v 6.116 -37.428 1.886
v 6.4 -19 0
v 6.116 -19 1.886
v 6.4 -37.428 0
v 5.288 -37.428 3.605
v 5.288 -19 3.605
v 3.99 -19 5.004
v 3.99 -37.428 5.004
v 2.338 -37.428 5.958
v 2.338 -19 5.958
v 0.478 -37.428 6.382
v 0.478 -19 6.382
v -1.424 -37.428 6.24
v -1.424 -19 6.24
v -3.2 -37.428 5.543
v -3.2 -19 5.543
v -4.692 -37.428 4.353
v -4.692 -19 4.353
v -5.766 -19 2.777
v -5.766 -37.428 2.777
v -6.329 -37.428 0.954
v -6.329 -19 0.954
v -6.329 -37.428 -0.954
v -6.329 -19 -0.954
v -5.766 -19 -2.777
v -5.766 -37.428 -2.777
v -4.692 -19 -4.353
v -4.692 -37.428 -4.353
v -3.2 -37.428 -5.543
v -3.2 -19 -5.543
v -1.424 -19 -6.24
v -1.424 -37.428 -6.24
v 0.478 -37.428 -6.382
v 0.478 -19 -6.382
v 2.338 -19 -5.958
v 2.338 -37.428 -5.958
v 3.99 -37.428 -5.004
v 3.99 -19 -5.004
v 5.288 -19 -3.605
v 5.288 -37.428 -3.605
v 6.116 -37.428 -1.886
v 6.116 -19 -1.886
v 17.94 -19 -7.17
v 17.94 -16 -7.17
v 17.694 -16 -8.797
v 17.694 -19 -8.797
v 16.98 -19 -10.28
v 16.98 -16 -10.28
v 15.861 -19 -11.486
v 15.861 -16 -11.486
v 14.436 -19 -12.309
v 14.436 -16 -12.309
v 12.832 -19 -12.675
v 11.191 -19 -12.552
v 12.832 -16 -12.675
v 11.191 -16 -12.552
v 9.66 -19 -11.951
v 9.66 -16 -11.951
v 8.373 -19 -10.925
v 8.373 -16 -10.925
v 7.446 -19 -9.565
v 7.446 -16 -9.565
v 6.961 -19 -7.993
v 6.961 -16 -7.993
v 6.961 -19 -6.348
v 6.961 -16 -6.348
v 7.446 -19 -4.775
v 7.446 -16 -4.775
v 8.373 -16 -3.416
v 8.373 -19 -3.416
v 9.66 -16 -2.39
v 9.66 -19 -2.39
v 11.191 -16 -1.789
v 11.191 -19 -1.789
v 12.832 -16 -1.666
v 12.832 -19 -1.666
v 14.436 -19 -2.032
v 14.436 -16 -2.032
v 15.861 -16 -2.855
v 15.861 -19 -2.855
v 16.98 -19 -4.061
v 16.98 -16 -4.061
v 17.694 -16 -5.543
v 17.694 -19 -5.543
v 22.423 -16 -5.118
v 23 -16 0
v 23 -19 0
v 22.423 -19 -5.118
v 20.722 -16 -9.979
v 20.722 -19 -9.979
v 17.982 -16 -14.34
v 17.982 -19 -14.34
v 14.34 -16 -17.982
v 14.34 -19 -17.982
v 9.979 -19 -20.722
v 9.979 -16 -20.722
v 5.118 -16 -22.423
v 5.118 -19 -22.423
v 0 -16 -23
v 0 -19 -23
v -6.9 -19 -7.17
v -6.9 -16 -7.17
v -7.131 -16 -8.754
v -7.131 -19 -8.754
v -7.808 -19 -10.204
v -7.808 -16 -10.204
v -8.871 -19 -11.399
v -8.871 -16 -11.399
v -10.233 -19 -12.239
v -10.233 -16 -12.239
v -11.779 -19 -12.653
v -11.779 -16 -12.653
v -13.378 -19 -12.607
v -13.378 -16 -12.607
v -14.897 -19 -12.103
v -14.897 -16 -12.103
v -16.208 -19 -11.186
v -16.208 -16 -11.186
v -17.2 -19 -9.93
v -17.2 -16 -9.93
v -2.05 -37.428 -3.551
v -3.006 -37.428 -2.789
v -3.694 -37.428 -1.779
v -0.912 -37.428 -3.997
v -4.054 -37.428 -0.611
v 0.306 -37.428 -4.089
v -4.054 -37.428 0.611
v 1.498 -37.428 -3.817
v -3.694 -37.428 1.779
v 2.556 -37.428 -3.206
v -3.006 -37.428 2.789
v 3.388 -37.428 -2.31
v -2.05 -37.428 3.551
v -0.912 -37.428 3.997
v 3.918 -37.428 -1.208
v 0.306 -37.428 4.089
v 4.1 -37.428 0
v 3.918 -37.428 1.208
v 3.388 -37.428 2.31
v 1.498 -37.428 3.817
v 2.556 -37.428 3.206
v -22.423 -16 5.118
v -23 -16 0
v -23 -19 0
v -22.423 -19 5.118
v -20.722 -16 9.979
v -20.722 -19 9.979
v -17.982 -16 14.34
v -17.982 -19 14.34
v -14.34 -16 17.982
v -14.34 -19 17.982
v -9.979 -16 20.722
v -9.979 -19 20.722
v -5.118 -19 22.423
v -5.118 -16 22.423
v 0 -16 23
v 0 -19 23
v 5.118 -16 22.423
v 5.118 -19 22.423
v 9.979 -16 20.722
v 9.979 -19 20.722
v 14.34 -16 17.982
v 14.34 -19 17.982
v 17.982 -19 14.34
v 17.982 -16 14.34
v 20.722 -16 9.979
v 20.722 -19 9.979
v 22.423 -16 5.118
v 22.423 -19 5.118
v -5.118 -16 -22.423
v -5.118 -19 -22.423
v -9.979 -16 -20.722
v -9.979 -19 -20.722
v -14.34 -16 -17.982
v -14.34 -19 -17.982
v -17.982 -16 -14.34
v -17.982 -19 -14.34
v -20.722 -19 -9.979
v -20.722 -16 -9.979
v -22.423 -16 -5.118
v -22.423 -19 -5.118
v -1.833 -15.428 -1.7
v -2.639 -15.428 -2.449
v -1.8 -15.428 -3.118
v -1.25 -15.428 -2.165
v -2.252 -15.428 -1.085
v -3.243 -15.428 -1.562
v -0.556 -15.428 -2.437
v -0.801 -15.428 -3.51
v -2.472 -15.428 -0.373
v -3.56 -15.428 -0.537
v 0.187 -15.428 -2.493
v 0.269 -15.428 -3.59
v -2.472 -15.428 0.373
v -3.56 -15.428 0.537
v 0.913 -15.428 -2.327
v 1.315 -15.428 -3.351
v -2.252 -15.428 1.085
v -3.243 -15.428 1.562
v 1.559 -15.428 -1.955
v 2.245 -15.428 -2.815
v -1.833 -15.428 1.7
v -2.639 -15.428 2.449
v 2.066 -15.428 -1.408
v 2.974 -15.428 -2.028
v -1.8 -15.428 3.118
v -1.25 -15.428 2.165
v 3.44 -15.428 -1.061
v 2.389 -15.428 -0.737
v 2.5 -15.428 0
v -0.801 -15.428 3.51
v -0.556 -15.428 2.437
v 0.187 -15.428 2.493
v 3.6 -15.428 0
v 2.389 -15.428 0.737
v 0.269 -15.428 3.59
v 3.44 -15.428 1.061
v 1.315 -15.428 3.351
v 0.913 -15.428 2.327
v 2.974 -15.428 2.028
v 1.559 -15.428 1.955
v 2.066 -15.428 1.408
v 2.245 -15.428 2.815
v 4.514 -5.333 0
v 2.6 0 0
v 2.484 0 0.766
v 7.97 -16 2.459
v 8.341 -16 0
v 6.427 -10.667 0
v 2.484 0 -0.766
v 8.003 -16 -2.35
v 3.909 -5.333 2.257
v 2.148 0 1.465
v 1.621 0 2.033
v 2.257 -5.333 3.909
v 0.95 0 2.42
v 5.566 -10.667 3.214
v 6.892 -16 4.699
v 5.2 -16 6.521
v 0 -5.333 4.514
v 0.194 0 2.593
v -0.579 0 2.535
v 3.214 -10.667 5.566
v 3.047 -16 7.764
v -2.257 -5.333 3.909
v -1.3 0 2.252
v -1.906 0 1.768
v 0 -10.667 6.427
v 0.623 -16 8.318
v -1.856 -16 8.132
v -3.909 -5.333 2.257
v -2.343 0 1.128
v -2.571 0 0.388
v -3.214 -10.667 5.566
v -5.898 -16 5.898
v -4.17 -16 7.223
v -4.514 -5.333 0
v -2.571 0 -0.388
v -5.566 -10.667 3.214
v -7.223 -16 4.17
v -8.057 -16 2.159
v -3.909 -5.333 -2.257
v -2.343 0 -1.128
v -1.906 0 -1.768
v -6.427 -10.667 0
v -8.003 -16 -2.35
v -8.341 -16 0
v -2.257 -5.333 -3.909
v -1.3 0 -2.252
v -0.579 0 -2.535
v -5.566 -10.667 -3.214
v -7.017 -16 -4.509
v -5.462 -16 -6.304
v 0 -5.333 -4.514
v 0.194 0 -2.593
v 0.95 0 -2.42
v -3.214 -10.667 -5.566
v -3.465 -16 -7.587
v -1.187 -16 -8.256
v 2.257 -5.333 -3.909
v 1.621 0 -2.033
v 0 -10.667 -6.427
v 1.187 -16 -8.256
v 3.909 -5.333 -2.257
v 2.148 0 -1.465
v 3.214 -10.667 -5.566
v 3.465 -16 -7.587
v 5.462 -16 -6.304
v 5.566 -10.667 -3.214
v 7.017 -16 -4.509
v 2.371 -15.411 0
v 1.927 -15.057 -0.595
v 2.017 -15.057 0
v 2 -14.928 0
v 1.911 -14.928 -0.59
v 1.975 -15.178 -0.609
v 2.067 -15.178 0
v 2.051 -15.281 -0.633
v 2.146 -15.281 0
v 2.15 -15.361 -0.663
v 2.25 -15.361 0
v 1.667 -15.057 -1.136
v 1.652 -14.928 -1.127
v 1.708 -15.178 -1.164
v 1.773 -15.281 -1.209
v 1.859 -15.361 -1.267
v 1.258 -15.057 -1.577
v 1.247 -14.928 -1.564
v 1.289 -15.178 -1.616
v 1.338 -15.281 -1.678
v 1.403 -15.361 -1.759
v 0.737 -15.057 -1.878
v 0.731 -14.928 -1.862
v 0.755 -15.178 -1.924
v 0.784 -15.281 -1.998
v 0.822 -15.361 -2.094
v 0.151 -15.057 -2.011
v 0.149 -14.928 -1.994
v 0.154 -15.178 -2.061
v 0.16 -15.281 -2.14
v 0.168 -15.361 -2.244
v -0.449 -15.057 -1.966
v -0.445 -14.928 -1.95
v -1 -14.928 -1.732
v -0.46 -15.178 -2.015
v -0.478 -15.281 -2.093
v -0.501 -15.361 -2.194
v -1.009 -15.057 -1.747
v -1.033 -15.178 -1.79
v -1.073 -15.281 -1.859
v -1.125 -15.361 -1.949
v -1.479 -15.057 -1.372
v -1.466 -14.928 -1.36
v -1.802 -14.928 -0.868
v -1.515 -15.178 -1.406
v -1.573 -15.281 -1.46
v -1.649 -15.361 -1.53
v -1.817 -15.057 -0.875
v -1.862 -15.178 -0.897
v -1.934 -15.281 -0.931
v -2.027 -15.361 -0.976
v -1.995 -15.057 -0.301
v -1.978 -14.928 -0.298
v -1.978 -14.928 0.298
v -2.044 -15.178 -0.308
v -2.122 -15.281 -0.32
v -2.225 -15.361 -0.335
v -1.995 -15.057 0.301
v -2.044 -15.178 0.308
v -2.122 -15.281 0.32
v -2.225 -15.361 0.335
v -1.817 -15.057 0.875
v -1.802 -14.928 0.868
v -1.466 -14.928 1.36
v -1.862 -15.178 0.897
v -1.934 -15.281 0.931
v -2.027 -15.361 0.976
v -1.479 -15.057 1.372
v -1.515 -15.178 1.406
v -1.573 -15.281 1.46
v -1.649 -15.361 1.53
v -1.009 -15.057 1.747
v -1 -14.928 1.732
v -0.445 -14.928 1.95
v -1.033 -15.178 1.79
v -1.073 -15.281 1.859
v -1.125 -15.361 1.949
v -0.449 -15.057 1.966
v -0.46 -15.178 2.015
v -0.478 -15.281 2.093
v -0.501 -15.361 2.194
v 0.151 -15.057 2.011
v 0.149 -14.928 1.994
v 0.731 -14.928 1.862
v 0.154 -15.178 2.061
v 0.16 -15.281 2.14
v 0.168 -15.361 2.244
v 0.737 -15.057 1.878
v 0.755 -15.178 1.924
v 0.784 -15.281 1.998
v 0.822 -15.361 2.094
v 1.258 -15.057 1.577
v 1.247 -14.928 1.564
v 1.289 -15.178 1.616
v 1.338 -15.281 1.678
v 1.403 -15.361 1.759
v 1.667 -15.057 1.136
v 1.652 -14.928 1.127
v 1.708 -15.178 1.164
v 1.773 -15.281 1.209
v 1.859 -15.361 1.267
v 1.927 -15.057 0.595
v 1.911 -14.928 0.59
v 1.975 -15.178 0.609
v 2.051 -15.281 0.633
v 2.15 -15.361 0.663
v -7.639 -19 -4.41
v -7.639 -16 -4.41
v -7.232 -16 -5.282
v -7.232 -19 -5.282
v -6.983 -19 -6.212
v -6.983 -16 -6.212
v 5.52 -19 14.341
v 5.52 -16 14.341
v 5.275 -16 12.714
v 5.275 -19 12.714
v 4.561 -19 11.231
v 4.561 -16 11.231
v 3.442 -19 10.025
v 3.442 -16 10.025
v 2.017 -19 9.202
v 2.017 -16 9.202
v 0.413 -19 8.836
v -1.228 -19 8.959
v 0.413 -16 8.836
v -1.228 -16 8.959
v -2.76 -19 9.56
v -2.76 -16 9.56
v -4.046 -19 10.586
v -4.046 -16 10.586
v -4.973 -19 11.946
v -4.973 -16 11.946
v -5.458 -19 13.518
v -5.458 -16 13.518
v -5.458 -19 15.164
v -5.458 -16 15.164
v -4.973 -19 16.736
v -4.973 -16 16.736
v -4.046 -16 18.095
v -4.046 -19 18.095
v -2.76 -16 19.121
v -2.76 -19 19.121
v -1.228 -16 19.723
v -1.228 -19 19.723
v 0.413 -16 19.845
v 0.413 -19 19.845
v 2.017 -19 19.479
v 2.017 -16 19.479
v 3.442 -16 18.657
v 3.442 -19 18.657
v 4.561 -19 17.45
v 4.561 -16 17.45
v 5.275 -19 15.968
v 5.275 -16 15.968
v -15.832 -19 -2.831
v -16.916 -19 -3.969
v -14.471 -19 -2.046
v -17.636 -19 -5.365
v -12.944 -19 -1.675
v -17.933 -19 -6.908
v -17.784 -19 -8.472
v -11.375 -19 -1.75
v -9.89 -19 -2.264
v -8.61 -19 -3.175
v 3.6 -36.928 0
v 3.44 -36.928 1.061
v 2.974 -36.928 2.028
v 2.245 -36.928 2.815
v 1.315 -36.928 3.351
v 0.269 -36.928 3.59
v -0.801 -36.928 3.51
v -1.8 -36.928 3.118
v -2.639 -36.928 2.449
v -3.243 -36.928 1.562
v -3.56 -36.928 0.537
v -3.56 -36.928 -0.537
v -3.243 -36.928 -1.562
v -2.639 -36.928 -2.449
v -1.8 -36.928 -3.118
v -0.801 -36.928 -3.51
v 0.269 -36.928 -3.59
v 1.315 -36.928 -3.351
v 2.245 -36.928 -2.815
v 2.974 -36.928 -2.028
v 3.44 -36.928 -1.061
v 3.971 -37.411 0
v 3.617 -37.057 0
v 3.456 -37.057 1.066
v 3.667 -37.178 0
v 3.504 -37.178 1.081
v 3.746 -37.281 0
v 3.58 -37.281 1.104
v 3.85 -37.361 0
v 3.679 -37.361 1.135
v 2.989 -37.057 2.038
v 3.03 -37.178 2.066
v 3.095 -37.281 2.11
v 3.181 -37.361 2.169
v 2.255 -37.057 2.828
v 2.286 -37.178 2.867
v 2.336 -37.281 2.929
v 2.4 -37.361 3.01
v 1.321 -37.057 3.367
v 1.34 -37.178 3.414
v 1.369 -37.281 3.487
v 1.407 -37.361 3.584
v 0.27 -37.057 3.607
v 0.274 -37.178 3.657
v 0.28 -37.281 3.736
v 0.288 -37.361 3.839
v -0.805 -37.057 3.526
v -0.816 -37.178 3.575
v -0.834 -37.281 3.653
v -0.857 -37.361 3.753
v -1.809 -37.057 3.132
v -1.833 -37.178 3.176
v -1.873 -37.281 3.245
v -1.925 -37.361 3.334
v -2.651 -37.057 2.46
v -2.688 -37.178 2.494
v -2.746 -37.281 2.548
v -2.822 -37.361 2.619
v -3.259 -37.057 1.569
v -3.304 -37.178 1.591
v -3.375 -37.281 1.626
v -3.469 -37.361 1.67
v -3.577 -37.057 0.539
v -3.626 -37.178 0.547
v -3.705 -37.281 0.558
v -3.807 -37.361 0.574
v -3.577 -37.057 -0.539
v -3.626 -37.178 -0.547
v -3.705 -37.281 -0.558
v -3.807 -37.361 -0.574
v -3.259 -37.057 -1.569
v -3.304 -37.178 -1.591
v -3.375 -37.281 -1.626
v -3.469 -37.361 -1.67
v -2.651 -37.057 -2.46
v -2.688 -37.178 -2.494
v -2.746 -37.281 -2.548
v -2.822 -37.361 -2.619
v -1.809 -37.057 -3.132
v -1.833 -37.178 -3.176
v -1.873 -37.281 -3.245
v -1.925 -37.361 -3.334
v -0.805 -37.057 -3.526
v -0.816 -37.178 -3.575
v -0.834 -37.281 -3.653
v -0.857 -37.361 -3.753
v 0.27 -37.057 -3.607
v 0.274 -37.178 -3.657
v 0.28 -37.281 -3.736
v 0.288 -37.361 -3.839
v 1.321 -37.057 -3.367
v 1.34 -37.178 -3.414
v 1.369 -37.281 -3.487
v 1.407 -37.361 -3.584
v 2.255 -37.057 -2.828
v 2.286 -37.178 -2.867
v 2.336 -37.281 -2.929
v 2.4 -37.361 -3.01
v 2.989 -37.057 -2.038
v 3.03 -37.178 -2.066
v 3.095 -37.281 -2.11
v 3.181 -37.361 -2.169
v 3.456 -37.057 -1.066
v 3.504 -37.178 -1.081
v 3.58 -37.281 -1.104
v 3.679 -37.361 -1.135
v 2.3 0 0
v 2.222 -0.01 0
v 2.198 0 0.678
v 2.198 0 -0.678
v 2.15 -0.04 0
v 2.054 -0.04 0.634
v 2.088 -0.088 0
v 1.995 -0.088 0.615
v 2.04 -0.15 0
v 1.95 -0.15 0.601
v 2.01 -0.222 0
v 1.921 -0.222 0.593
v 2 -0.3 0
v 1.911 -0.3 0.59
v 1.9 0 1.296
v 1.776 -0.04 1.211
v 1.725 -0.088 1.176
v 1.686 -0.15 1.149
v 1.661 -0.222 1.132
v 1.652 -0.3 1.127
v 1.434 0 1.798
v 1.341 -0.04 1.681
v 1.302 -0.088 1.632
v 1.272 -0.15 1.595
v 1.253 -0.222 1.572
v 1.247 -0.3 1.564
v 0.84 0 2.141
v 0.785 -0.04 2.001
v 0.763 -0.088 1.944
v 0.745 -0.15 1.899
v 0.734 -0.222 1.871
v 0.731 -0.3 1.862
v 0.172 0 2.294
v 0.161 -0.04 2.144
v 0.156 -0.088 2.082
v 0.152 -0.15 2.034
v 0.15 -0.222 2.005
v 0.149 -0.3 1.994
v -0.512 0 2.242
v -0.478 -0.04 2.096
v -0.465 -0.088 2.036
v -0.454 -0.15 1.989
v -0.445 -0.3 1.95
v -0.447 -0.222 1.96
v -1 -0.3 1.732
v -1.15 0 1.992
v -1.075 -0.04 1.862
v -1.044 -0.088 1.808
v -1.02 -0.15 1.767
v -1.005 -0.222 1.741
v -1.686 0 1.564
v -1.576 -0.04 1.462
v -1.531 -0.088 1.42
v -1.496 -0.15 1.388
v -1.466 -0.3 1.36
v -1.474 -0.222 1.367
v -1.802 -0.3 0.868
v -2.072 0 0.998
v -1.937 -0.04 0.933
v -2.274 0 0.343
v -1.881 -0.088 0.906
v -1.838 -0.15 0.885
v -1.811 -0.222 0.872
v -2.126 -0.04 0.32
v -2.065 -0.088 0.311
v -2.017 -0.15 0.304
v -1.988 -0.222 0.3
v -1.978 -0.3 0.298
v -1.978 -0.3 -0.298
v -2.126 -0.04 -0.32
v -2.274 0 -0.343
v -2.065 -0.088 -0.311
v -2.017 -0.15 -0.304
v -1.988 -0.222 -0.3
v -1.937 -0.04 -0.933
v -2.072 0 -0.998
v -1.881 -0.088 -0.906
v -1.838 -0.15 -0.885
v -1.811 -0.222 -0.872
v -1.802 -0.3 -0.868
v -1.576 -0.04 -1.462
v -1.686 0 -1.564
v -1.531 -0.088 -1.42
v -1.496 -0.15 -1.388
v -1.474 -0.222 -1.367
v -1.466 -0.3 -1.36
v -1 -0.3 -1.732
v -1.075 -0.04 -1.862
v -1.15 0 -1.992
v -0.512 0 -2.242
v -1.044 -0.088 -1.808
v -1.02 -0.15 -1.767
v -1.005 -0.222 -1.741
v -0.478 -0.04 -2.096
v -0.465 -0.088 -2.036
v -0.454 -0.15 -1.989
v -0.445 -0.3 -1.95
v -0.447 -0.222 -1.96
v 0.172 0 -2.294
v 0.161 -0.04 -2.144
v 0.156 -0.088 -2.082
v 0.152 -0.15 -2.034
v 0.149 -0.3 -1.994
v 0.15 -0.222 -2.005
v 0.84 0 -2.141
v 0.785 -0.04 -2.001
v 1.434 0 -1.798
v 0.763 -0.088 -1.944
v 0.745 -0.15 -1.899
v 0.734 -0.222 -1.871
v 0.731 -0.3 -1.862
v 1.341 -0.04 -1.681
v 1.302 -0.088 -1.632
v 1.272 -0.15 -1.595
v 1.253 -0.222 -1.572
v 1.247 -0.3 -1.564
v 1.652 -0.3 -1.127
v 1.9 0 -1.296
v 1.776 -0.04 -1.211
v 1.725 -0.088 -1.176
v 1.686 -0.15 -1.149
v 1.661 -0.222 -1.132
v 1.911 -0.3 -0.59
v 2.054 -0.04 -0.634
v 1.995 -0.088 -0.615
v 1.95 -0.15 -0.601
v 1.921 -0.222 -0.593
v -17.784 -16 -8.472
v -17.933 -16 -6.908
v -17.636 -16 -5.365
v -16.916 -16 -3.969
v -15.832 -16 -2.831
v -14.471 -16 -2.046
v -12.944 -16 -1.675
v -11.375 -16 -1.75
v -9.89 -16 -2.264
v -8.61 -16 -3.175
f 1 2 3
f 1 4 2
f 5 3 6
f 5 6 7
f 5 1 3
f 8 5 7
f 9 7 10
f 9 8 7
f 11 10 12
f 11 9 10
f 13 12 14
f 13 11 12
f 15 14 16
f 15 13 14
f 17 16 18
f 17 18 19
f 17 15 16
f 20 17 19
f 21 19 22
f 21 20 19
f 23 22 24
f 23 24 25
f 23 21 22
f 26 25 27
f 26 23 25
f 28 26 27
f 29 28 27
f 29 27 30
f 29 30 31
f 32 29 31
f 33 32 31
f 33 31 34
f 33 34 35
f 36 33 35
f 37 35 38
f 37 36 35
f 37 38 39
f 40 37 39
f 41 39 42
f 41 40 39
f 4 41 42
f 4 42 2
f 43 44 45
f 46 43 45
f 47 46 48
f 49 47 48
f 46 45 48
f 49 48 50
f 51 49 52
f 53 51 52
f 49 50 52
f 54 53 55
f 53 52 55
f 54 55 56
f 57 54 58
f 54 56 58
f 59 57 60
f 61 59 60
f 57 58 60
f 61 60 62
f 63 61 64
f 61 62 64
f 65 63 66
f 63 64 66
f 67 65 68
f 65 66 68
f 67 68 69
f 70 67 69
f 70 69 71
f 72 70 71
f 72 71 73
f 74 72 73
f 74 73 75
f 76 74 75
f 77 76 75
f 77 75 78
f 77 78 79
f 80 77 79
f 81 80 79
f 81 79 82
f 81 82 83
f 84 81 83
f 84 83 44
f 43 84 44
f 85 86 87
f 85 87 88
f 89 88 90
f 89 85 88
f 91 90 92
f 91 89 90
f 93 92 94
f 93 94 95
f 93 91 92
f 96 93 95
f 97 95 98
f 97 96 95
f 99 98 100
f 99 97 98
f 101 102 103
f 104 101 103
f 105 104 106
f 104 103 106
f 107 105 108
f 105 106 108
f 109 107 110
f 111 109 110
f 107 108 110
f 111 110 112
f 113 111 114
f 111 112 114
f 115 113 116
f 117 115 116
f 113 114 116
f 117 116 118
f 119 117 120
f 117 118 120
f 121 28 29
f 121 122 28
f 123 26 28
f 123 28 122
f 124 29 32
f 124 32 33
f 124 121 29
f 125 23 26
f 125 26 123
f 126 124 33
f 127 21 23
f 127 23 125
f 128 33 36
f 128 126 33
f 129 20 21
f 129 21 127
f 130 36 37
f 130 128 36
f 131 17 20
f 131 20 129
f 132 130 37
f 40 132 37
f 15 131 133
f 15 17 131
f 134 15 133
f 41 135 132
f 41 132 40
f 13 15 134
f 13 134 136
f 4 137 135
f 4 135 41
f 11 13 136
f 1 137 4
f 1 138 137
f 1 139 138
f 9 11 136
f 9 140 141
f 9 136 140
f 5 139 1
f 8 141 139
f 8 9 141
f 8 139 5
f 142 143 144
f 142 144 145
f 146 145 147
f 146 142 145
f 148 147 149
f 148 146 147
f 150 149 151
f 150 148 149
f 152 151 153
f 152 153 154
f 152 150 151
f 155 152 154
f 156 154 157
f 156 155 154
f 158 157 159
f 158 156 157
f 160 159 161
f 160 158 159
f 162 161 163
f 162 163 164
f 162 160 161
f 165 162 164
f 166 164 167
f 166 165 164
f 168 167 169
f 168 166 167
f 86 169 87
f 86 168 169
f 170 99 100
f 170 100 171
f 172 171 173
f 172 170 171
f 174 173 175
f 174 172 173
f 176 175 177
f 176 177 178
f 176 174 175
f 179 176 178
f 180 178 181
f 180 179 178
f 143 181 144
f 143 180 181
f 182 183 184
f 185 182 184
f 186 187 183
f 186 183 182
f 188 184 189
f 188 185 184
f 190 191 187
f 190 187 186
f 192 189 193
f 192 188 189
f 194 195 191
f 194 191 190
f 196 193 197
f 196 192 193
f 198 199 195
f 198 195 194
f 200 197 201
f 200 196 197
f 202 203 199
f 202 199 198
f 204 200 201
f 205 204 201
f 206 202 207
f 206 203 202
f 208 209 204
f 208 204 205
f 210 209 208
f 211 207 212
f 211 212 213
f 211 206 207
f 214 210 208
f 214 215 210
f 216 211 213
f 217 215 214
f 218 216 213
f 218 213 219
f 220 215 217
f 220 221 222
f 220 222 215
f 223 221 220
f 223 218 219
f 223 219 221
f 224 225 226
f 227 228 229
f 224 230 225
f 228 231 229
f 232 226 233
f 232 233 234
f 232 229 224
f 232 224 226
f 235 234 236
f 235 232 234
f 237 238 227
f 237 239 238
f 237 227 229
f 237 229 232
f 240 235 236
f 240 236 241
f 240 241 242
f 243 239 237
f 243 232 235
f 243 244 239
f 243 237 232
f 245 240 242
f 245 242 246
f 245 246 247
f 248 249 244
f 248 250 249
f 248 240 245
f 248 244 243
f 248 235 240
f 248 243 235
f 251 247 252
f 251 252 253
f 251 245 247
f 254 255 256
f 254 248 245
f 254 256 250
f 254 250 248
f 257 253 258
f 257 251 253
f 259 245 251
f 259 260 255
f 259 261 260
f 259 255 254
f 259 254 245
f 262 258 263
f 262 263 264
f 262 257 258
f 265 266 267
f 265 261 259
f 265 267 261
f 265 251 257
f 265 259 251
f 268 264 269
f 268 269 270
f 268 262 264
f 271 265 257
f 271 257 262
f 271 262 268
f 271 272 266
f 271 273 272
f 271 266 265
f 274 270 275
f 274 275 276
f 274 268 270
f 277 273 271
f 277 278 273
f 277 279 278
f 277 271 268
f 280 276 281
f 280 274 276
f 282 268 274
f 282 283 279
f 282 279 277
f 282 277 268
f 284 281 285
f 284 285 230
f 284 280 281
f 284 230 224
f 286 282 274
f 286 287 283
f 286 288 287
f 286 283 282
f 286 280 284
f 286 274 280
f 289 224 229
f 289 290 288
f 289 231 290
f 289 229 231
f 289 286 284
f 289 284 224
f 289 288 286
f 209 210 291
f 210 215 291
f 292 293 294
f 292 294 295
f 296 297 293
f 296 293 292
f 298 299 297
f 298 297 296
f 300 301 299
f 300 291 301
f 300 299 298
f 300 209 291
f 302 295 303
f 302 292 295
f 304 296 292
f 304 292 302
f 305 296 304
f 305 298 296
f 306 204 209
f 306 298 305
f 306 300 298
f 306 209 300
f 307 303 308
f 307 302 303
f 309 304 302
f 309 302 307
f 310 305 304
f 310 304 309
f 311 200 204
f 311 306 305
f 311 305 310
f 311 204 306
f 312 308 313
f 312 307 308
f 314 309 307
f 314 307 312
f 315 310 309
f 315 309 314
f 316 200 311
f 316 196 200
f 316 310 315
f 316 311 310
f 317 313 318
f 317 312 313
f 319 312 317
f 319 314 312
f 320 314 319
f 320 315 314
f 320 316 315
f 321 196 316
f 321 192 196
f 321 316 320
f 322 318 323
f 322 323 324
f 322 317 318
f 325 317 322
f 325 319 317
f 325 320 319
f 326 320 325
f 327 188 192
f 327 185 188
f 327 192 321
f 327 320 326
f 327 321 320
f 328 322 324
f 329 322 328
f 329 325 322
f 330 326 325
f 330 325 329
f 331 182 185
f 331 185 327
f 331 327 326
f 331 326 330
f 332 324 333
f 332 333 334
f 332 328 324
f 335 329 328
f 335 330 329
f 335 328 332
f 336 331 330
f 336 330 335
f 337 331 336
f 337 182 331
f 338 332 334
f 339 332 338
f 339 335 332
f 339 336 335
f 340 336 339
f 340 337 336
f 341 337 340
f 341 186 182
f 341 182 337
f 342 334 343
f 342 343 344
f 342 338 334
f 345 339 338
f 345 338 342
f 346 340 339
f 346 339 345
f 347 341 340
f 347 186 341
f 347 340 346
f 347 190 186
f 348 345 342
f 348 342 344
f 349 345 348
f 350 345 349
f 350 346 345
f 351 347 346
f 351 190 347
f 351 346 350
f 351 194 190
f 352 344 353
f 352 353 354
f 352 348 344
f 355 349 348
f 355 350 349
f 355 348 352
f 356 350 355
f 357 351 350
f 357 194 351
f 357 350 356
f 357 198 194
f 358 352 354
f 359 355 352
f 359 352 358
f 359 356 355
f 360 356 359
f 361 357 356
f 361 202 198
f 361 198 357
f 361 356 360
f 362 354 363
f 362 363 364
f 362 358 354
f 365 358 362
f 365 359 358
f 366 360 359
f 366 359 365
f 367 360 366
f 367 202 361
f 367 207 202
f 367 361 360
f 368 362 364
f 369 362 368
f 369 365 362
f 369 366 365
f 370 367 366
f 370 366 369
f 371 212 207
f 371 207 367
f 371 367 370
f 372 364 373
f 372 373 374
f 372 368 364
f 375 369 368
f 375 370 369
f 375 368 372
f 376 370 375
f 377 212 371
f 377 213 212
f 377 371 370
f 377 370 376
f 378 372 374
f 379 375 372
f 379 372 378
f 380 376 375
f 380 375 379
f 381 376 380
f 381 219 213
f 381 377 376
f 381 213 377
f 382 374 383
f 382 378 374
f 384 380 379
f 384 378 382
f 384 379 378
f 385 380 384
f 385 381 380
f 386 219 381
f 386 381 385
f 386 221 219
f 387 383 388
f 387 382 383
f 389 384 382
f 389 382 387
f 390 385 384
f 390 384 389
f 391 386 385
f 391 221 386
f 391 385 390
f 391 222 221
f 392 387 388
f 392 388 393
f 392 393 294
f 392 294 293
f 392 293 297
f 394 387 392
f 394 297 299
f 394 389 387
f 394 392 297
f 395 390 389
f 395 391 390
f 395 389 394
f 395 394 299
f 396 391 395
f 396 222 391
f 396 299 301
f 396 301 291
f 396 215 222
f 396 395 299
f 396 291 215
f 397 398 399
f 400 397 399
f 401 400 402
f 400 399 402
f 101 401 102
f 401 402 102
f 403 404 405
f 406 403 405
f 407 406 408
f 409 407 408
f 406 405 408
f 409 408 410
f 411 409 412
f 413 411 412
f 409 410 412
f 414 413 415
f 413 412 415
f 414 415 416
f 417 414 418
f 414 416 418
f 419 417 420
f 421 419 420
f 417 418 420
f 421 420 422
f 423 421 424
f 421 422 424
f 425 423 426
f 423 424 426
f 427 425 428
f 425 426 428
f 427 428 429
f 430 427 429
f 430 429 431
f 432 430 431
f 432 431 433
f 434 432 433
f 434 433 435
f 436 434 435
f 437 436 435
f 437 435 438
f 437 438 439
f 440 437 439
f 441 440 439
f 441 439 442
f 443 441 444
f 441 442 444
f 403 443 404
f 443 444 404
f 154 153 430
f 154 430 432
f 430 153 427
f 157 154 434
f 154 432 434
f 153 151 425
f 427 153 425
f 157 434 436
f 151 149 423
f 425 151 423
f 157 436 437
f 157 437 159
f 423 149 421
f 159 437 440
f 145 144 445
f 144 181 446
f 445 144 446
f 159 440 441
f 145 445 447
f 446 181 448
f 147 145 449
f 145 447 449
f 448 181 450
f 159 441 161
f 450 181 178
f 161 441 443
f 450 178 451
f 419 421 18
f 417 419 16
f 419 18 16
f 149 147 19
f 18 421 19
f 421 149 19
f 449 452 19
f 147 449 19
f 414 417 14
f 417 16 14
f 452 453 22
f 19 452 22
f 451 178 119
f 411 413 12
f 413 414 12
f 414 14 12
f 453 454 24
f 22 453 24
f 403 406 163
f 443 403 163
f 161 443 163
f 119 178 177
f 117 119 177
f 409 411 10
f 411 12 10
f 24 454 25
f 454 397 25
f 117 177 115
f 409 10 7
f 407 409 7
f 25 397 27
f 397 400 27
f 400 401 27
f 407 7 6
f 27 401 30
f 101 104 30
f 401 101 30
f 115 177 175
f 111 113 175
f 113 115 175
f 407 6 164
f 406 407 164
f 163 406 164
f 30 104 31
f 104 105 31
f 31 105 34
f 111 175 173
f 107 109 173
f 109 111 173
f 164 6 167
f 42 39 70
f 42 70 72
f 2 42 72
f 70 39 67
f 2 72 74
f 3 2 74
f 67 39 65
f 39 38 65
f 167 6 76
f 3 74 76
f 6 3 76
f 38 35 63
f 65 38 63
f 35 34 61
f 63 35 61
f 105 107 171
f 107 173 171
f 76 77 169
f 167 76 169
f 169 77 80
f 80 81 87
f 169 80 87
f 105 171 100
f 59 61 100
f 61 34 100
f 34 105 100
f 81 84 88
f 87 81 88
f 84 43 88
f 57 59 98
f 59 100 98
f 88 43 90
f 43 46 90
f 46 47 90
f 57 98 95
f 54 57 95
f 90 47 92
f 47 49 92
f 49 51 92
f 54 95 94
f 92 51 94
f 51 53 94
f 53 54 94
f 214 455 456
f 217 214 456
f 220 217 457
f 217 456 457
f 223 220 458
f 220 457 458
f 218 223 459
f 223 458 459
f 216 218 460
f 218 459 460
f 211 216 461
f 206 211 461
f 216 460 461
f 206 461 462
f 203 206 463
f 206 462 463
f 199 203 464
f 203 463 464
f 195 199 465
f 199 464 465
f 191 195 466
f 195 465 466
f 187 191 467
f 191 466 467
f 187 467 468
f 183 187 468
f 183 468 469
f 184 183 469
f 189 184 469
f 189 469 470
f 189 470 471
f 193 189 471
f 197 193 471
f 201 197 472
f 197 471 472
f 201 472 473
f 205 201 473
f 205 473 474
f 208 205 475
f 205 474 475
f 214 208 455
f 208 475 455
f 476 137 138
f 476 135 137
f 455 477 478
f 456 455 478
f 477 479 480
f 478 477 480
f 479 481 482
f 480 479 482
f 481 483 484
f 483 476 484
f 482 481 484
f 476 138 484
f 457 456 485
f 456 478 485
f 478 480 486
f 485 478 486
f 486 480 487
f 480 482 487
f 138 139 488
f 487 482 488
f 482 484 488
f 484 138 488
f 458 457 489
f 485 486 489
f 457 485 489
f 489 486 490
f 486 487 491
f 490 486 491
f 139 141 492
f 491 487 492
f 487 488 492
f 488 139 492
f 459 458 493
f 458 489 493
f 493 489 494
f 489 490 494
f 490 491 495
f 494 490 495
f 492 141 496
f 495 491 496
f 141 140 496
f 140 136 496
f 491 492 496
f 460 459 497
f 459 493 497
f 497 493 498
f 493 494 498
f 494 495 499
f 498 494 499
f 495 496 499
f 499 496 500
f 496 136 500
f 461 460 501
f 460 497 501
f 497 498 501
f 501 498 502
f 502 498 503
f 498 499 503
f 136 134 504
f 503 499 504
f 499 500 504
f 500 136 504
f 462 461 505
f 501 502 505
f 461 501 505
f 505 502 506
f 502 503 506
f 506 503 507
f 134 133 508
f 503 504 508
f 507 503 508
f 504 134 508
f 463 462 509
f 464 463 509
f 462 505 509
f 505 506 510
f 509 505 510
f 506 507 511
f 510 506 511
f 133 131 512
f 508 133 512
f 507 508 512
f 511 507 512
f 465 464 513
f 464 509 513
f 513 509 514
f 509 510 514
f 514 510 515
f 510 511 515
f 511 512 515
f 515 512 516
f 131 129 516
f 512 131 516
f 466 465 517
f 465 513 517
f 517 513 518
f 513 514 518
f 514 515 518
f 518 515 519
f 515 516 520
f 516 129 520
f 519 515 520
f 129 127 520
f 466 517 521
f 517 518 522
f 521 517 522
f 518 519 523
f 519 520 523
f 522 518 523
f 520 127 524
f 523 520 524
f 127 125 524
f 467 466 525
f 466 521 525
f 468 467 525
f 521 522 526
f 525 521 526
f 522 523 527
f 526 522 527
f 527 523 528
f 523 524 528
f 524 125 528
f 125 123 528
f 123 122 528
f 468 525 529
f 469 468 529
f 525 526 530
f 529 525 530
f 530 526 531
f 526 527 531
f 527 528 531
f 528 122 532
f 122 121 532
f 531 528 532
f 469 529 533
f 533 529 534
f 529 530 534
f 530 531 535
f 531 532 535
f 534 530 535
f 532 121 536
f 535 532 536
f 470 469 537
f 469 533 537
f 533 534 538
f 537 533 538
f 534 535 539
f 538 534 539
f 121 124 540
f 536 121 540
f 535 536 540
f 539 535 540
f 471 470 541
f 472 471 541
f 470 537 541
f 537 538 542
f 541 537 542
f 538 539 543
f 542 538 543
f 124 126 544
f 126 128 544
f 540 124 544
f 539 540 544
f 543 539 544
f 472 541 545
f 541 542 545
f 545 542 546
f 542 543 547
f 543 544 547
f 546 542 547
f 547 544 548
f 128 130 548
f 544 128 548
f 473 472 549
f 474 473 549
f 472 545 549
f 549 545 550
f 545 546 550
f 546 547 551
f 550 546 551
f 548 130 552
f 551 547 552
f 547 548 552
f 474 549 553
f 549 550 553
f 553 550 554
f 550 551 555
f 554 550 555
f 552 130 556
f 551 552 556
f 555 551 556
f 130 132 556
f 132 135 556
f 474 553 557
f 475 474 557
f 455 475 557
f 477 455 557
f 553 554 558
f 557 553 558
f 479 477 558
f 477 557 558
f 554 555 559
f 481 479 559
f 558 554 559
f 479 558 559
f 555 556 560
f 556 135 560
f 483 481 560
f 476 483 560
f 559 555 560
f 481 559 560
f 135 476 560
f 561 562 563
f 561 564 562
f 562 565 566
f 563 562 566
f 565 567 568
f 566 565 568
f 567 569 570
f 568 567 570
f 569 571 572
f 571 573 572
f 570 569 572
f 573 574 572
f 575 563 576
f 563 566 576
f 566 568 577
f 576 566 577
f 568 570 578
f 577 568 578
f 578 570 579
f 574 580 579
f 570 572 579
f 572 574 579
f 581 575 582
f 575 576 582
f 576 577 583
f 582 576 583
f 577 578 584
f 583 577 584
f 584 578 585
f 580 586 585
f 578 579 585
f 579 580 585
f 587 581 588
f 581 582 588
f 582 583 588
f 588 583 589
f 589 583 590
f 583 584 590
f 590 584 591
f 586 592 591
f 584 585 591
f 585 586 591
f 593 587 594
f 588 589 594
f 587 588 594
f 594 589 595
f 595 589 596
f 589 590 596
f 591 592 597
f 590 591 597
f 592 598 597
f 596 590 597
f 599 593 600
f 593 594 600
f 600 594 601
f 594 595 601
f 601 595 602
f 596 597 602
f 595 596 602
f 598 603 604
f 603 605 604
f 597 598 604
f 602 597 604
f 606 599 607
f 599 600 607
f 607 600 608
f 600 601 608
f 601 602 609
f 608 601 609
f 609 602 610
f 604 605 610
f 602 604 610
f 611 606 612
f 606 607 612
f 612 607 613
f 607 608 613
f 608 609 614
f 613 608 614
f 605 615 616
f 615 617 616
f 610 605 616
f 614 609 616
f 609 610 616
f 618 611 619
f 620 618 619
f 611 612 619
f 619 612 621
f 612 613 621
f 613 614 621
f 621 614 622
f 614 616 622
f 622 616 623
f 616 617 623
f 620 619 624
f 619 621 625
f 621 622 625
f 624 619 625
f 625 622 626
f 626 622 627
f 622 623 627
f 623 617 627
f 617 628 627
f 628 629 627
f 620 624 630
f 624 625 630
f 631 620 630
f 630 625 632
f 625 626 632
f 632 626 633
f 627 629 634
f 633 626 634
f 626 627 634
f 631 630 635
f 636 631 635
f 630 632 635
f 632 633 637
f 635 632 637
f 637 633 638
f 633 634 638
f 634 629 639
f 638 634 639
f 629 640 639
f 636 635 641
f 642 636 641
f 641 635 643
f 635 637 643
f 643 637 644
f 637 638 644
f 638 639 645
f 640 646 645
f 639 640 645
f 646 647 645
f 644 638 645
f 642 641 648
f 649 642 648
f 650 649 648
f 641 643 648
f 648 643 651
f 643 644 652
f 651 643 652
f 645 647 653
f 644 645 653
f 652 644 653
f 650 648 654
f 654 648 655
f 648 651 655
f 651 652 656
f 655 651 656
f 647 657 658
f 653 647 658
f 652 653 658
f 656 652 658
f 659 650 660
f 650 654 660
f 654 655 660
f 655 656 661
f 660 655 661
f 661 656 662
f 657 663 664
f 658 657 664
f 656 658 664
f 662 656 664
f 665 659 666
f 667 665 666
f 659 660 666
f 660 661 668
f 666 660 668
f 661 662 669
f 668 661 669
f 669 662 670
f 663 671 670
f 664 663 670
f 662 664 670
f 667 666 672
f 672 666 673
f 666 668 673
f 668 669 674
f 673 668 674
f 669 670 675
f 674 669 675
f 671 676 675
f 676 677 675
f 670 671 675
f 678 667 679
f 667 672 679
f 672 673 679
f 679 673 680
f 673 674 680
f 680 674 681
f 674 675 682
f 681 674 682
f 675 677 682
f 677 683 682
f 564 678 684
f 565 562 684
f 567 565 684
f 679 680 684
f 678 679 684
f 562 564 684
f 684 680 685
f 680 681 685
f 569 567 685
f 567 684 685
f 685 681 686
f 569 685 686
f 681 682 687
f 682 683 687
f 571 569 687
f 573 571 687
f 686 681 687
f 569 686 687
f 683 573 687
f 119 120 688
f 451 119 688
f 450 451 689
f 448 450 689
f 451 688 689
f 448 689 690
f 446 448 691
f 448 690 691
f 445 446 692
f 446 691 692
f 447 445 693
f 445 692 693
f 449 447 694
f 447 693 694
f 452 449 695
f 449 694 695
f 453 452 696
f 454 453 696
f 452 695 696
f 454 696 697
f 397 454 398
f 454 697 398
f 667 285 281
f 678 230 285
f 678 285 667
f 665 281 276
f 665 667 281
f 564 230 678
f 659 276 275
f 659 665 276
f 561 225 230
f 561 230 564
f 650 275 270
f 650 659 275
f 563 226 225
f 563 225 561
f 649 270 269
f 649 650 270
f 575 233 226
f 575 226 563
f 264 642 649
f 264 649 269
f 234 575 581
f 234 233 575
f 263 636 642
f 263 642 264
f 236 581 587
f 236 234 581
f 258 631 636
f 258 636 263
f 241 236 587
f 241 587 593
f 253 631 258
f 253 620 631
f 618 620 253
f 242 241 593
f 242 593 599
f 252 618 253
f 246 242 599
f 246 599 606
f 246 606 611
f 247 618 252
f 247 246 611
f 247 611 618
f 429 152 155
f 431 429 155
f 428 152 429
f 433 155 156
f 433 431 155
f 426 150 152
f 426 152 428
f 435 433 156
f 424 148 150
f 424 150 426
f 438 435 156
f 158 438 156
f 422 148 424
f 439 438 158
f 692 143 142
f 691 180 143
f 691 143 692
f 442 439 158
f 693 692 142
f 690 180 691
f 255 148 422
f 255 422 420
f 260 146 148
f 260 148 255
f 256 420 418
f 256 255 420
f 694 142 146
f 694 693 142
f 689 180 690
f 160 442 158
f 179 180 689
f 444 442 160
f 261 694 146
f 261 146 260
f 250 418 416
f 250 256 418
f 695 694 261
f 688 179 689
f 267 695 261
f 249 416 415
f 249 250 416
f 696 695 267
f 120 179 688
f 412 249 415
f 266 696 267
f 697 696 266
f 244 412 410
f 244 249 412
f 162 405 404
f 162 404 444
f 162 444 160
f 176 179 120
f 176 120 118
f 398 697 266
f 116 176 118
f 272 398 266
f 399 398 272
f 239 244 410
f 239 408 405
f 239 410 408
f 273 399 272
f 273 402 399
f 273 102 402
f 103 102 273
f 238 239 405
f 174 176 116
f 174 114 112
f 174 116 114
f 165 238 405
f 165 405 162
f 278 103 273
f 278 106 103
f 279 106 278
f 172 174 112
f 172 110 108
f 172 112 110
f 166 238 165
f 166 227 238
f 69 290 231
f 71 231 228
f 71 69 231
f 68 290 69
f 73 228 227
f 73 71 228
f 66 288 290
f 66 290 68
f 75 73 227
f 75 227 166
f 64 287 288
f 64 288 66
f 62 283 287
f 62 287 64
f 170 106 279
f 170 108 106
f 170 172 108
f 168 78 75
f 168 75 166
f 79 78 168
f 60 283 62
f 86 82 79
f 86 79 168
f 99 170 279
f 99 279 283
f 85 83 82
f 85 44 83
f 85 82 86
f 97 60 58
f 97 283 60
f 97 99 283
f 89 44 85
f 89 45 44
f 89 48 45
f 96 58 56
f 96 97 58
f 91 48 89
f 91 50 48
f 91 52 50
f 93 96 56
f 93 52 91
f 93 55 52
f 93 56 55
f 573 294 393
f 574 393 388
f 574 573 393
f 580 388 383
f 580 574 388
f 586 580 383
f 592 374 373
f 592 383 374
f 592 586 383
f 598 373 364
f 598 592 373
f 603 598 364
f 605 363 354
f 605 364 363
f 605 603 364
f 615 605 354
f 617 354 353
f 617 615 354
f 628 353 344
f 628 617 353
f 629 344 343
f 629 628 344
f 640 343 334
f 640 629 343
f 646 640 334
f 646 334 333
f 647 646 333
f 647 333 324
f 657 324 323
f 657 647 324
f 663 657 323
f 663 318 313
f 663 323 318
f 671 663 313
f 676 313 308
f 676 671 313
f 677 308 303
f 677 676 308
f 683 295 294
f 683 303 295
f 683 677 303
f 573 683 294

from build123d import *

# Parameters (mm, degrees)
FILLET1_R               = 0.3
SKETCH3_R               = 3.6
CUT_EXTRUDE1_DEPTH      = 1
CUT_EXTRUDE1_DEPTH_BACK = 22
FILLET2_R               = 0.5
FILLET3_R               = 0.5
SKETCH5_W               = 6.5
SKETCH5_H               = 2
SKETCH6_W               = 8.5
SKETCH6_H               = 2
SKETCH8_W               = 8.5
SKETCH8_H               = 3
SKETCH7_W               = 6.5
SKETCH7_H               = 3
SKETCH11_R              = 5.52
CUT_EXTRUDE3_DEPTH      = 10
CUT_EXTRUDE4_DEPTH      = 10
BOSS_EXTRUDE1_DEPTH     = 3
SKETCH15_R              = 23
SKETCH15_R_2            = 8.340902118
SKETCH15_R_3            = 5.6
BOSS_EXTRUDE4_DEPTH     = 3
SKETCH16_R              = 5.52
CUT_EXTRUDE6_DEPTH      = 3


with BuildPart() as part:
    # Sketch2 → Revolve1 (revolve)
    with BuildSketch(Plane.XY):
        Polygon((2, 0), (2.6, 0), (8.340902118, -16), (20.340902118, -16), (20.340902118, -19), (6.4, -19), (6.4, -37.427752697), (3.4, -37.427752697), (3.4, -16), (2, -16), align=None)
    revolve(axis=Axis((0, 0, 0), (0, -1, 0)))

    # Fillet1
    fillet1_edges = [part.edges().sort_by_distance(p)[0] for p in [
        (-2, 0, 0),
    ]]
    fillet(fillet1_edges, radius=FILLET1_R)

    # Sketch3 → Cut-Extrude1 (cut, two sides)
    with BuildSketch(Plane.XZ.offset(37.427752697)) as cut_extrude1_sk:
        Circle(SKETCH3_R)
    extrude(amount=CUT_EXTRUDE1_DEPTH, mode=Mode.SUBTRACT)
    extrude(cut_extrude1_sk.sketch, amount=-CUT_EXTRUDE1_DEPTH_BACK, mode=Mode.SUBTRACT)

    # Fillet2
    fillet2_edges = [part.edges().sort_by_distance(p)[0] for p in [
        (-2, -15.427752697, 0),
    ]]
    fillet(fillet2_edges, radius=FILLET2_R)

    # Fillet3
    fillet3_edges = [part.edges().sort_by_distance(p)[0] for p in [
        (-3.6, -37.427752697, 0),
    ]]
    fillet(fillet3_edges, radius=FILLET3_R)

    # Sketch5 → Cut-Loft2 section 0
    with BuildSketch(Plane(origin=(0, -16, 0), x_dir=(1, 0, 0), z_dir=(0, 1, 0))):
        with Locations((0, -15)):
            Rectangle(SKETCH5_W, SKETCH5_H)
    # Sketch6 → Cut-Loft2 section 1
    with BuildSketch(Plane.XZ.offset(19)):
        with Locations((0, 15)):
            Rectangle(SKETCH6_W, SKETCH6_H)
    loft(mode=Mode.SUBTRACT)

    # Sketch8 → Cut-Loft3 section 0
    with BuildSketch(Plane.XZ.offset(19)):
        with Locations((0, 15)):
            Rectangle(SKETCH8_W, SKETCH8_H)
    # Sketch7 → Cut-Loft3 section 1
    with BuildSketch(Plane(origin=(0, -16, 0), x_dir=(1, 0, 0), z_dir=(0, 1, 0))):
        with Locations((0, -15)):
            Rectangle(SKETCH7_W, SKETCH7_H)
    loft(mode=Mode.SUBTRACT)

    # Sketch11 → Cut-Extrude3 (cut)
    with BuildSketch(Plane(origin=(0, -16, 0), x_dir=(1, 0, 0), z_dir=(0, 1, 0))):
        with Locations((0, 14.340902118)):
            Circle(SKETCH11_R)
        with Locations((12.419585547, 7.170451059)):
            Circle(SKETCH11_R)
        with BuildLine():
            ThreePointArc((-17.200045776, 9.930451059), (-15.179585547, 2.38999083), (-7.639125318, 4.410451059))
            Line((-7.639125318, 4.410451059), (-12.419585547, 7.170451059))
            Line((-12.419585547, 7.170451059), (-17.200045776, 9.930451059))
        make_face()
        with BuildLine():
            Line((-12.419585547, 7.170451059), (-7.639125318, 4.410451059))
            ThreePointArc((-7.639125318, 4.410451059), (-7.087674986, 5.74176993), (-6.899585547, 7.170451059))
            ThreePointArc((-6.899585547, 7.170451059), (-10.990904418, 12.50236162), (-17.200045776, 9.930451059))
            Line((-17.200045776, 9.930451059), (-12.419585547, 7.170451059))
        make_face()
    extrude(amount=-CUT_EXTRUDE3_DEPTH, mode=Mode.SUBTRACT)

    # Sketch13 → Cut-Extrude4 (cut)
    with BuildSketch(Plane(origin=(0, -16, 0), x_dir=(1, 0, 0), z_dir=(0, 1, 0))):
        with BuildLine():
            Line((-8.340902118, 0), (-20.340902118, 0))
            ThreePointArc((-20.340902118, 0), (-17.61573797, -10.170451059), (-10.170451059, -17.61573797))
            Line((-10.170451059, -17.61573797), (-4.170451059, -7.223433125))
            ThreePointArc((-4.170451059, -7.223433125), (-7.223433125, -4.170451059), (-8.340902118, 0))
        make_face()
        with BuildLine():
            Line((8.340902118, 0), (20.340902118, 0))
            ThreePointArc((20.340902118, 0), (17.546873261, -10.288806428), (9.932362997, -17.751069384))
            Line((9.932362997, -17.751069384), (4.072821701, -7.278926537))
            ThreePointArc((4.072821701, -7.278926537), (7.195194761, -4.218983349), (8.340902118, 0))
        make_face()
    extrude(amount=-CUT_EXTRUDE4_DEPTH, mode=Mode.SUBTRACT)

    # Sketch14 → Boss-Extrude1 (add)
    with BuildSketch(Plane(origin=(0, -16, 0), x_dir=(1, 0, 0), z_dir=(0, 1, 0))):
        with BuildLine():
            ThreePointArc((0, 20.340902118), (14.383189823, 14.383189823), (20.340902118, 0))
            Line((20.340902118, 0), (23, 0))
            ThreePointArc((23, 0), (16.263455967, 16.263455967), (0, 23))
            Line((0, 23), (0, 20.340902118))
        make_face()
        with BuildLine():
            Line((-23, 0), (-20.340902118, 0))
            ThreePointArc((-20.340902118, 0), (-14.383189823, 14.383189823), (0, 20.340902118))
            Line((0, 20.340902118), (0, 23))
            ThreePointArc((0, 23), (-16.263455967, 16.263455967), (-23, 0))
        make_face()
    extrude(amount=-BOSS_EXTRUDE1_DEPTH)

    # Sketch15 → Boss-Extrude4 (add)
    with BuildSketch(Plane(origin=(0, -16, 0), x_dir=(1, 0, 0), z_dir=(0, 1, 0))):
        Circle(SKETCH15_R)
        Circle(SKETCH15_R_2, mode=Mode.SUBTRACT)
        with Locations((-12.419585547, 7.170451059)):
            Circle(SKETCH15_R_3, mode=Mode.SUBTRACT)
        with Locations((12.419585547, 7.170451059)):
            Circle(SKETCH15_R_3, mode=Mode.SUBTRACT)
        with Locations((0, -14.340902118)):
            Circle(SKETCH15_R_3, mode=Mode.SUBTRACT)
    extrude(amount=-BOSS_EXTRUDE4_DEPTH)

    # Sketch16 → Cut-Extrude6 (cut)
    with BuildSketch(Plane(origin=(0, -16, 0), x_dir=(1, 0, 0), z_dir=(0, 1, 0))):
        with Locations((0, -14.34090212)):
            Circle(SKETCH16_R)
    extrude(amount=-CUT_EXTRUDE6_DEPTH, mode=Mode.SUBTRACT)


solid = part.part
